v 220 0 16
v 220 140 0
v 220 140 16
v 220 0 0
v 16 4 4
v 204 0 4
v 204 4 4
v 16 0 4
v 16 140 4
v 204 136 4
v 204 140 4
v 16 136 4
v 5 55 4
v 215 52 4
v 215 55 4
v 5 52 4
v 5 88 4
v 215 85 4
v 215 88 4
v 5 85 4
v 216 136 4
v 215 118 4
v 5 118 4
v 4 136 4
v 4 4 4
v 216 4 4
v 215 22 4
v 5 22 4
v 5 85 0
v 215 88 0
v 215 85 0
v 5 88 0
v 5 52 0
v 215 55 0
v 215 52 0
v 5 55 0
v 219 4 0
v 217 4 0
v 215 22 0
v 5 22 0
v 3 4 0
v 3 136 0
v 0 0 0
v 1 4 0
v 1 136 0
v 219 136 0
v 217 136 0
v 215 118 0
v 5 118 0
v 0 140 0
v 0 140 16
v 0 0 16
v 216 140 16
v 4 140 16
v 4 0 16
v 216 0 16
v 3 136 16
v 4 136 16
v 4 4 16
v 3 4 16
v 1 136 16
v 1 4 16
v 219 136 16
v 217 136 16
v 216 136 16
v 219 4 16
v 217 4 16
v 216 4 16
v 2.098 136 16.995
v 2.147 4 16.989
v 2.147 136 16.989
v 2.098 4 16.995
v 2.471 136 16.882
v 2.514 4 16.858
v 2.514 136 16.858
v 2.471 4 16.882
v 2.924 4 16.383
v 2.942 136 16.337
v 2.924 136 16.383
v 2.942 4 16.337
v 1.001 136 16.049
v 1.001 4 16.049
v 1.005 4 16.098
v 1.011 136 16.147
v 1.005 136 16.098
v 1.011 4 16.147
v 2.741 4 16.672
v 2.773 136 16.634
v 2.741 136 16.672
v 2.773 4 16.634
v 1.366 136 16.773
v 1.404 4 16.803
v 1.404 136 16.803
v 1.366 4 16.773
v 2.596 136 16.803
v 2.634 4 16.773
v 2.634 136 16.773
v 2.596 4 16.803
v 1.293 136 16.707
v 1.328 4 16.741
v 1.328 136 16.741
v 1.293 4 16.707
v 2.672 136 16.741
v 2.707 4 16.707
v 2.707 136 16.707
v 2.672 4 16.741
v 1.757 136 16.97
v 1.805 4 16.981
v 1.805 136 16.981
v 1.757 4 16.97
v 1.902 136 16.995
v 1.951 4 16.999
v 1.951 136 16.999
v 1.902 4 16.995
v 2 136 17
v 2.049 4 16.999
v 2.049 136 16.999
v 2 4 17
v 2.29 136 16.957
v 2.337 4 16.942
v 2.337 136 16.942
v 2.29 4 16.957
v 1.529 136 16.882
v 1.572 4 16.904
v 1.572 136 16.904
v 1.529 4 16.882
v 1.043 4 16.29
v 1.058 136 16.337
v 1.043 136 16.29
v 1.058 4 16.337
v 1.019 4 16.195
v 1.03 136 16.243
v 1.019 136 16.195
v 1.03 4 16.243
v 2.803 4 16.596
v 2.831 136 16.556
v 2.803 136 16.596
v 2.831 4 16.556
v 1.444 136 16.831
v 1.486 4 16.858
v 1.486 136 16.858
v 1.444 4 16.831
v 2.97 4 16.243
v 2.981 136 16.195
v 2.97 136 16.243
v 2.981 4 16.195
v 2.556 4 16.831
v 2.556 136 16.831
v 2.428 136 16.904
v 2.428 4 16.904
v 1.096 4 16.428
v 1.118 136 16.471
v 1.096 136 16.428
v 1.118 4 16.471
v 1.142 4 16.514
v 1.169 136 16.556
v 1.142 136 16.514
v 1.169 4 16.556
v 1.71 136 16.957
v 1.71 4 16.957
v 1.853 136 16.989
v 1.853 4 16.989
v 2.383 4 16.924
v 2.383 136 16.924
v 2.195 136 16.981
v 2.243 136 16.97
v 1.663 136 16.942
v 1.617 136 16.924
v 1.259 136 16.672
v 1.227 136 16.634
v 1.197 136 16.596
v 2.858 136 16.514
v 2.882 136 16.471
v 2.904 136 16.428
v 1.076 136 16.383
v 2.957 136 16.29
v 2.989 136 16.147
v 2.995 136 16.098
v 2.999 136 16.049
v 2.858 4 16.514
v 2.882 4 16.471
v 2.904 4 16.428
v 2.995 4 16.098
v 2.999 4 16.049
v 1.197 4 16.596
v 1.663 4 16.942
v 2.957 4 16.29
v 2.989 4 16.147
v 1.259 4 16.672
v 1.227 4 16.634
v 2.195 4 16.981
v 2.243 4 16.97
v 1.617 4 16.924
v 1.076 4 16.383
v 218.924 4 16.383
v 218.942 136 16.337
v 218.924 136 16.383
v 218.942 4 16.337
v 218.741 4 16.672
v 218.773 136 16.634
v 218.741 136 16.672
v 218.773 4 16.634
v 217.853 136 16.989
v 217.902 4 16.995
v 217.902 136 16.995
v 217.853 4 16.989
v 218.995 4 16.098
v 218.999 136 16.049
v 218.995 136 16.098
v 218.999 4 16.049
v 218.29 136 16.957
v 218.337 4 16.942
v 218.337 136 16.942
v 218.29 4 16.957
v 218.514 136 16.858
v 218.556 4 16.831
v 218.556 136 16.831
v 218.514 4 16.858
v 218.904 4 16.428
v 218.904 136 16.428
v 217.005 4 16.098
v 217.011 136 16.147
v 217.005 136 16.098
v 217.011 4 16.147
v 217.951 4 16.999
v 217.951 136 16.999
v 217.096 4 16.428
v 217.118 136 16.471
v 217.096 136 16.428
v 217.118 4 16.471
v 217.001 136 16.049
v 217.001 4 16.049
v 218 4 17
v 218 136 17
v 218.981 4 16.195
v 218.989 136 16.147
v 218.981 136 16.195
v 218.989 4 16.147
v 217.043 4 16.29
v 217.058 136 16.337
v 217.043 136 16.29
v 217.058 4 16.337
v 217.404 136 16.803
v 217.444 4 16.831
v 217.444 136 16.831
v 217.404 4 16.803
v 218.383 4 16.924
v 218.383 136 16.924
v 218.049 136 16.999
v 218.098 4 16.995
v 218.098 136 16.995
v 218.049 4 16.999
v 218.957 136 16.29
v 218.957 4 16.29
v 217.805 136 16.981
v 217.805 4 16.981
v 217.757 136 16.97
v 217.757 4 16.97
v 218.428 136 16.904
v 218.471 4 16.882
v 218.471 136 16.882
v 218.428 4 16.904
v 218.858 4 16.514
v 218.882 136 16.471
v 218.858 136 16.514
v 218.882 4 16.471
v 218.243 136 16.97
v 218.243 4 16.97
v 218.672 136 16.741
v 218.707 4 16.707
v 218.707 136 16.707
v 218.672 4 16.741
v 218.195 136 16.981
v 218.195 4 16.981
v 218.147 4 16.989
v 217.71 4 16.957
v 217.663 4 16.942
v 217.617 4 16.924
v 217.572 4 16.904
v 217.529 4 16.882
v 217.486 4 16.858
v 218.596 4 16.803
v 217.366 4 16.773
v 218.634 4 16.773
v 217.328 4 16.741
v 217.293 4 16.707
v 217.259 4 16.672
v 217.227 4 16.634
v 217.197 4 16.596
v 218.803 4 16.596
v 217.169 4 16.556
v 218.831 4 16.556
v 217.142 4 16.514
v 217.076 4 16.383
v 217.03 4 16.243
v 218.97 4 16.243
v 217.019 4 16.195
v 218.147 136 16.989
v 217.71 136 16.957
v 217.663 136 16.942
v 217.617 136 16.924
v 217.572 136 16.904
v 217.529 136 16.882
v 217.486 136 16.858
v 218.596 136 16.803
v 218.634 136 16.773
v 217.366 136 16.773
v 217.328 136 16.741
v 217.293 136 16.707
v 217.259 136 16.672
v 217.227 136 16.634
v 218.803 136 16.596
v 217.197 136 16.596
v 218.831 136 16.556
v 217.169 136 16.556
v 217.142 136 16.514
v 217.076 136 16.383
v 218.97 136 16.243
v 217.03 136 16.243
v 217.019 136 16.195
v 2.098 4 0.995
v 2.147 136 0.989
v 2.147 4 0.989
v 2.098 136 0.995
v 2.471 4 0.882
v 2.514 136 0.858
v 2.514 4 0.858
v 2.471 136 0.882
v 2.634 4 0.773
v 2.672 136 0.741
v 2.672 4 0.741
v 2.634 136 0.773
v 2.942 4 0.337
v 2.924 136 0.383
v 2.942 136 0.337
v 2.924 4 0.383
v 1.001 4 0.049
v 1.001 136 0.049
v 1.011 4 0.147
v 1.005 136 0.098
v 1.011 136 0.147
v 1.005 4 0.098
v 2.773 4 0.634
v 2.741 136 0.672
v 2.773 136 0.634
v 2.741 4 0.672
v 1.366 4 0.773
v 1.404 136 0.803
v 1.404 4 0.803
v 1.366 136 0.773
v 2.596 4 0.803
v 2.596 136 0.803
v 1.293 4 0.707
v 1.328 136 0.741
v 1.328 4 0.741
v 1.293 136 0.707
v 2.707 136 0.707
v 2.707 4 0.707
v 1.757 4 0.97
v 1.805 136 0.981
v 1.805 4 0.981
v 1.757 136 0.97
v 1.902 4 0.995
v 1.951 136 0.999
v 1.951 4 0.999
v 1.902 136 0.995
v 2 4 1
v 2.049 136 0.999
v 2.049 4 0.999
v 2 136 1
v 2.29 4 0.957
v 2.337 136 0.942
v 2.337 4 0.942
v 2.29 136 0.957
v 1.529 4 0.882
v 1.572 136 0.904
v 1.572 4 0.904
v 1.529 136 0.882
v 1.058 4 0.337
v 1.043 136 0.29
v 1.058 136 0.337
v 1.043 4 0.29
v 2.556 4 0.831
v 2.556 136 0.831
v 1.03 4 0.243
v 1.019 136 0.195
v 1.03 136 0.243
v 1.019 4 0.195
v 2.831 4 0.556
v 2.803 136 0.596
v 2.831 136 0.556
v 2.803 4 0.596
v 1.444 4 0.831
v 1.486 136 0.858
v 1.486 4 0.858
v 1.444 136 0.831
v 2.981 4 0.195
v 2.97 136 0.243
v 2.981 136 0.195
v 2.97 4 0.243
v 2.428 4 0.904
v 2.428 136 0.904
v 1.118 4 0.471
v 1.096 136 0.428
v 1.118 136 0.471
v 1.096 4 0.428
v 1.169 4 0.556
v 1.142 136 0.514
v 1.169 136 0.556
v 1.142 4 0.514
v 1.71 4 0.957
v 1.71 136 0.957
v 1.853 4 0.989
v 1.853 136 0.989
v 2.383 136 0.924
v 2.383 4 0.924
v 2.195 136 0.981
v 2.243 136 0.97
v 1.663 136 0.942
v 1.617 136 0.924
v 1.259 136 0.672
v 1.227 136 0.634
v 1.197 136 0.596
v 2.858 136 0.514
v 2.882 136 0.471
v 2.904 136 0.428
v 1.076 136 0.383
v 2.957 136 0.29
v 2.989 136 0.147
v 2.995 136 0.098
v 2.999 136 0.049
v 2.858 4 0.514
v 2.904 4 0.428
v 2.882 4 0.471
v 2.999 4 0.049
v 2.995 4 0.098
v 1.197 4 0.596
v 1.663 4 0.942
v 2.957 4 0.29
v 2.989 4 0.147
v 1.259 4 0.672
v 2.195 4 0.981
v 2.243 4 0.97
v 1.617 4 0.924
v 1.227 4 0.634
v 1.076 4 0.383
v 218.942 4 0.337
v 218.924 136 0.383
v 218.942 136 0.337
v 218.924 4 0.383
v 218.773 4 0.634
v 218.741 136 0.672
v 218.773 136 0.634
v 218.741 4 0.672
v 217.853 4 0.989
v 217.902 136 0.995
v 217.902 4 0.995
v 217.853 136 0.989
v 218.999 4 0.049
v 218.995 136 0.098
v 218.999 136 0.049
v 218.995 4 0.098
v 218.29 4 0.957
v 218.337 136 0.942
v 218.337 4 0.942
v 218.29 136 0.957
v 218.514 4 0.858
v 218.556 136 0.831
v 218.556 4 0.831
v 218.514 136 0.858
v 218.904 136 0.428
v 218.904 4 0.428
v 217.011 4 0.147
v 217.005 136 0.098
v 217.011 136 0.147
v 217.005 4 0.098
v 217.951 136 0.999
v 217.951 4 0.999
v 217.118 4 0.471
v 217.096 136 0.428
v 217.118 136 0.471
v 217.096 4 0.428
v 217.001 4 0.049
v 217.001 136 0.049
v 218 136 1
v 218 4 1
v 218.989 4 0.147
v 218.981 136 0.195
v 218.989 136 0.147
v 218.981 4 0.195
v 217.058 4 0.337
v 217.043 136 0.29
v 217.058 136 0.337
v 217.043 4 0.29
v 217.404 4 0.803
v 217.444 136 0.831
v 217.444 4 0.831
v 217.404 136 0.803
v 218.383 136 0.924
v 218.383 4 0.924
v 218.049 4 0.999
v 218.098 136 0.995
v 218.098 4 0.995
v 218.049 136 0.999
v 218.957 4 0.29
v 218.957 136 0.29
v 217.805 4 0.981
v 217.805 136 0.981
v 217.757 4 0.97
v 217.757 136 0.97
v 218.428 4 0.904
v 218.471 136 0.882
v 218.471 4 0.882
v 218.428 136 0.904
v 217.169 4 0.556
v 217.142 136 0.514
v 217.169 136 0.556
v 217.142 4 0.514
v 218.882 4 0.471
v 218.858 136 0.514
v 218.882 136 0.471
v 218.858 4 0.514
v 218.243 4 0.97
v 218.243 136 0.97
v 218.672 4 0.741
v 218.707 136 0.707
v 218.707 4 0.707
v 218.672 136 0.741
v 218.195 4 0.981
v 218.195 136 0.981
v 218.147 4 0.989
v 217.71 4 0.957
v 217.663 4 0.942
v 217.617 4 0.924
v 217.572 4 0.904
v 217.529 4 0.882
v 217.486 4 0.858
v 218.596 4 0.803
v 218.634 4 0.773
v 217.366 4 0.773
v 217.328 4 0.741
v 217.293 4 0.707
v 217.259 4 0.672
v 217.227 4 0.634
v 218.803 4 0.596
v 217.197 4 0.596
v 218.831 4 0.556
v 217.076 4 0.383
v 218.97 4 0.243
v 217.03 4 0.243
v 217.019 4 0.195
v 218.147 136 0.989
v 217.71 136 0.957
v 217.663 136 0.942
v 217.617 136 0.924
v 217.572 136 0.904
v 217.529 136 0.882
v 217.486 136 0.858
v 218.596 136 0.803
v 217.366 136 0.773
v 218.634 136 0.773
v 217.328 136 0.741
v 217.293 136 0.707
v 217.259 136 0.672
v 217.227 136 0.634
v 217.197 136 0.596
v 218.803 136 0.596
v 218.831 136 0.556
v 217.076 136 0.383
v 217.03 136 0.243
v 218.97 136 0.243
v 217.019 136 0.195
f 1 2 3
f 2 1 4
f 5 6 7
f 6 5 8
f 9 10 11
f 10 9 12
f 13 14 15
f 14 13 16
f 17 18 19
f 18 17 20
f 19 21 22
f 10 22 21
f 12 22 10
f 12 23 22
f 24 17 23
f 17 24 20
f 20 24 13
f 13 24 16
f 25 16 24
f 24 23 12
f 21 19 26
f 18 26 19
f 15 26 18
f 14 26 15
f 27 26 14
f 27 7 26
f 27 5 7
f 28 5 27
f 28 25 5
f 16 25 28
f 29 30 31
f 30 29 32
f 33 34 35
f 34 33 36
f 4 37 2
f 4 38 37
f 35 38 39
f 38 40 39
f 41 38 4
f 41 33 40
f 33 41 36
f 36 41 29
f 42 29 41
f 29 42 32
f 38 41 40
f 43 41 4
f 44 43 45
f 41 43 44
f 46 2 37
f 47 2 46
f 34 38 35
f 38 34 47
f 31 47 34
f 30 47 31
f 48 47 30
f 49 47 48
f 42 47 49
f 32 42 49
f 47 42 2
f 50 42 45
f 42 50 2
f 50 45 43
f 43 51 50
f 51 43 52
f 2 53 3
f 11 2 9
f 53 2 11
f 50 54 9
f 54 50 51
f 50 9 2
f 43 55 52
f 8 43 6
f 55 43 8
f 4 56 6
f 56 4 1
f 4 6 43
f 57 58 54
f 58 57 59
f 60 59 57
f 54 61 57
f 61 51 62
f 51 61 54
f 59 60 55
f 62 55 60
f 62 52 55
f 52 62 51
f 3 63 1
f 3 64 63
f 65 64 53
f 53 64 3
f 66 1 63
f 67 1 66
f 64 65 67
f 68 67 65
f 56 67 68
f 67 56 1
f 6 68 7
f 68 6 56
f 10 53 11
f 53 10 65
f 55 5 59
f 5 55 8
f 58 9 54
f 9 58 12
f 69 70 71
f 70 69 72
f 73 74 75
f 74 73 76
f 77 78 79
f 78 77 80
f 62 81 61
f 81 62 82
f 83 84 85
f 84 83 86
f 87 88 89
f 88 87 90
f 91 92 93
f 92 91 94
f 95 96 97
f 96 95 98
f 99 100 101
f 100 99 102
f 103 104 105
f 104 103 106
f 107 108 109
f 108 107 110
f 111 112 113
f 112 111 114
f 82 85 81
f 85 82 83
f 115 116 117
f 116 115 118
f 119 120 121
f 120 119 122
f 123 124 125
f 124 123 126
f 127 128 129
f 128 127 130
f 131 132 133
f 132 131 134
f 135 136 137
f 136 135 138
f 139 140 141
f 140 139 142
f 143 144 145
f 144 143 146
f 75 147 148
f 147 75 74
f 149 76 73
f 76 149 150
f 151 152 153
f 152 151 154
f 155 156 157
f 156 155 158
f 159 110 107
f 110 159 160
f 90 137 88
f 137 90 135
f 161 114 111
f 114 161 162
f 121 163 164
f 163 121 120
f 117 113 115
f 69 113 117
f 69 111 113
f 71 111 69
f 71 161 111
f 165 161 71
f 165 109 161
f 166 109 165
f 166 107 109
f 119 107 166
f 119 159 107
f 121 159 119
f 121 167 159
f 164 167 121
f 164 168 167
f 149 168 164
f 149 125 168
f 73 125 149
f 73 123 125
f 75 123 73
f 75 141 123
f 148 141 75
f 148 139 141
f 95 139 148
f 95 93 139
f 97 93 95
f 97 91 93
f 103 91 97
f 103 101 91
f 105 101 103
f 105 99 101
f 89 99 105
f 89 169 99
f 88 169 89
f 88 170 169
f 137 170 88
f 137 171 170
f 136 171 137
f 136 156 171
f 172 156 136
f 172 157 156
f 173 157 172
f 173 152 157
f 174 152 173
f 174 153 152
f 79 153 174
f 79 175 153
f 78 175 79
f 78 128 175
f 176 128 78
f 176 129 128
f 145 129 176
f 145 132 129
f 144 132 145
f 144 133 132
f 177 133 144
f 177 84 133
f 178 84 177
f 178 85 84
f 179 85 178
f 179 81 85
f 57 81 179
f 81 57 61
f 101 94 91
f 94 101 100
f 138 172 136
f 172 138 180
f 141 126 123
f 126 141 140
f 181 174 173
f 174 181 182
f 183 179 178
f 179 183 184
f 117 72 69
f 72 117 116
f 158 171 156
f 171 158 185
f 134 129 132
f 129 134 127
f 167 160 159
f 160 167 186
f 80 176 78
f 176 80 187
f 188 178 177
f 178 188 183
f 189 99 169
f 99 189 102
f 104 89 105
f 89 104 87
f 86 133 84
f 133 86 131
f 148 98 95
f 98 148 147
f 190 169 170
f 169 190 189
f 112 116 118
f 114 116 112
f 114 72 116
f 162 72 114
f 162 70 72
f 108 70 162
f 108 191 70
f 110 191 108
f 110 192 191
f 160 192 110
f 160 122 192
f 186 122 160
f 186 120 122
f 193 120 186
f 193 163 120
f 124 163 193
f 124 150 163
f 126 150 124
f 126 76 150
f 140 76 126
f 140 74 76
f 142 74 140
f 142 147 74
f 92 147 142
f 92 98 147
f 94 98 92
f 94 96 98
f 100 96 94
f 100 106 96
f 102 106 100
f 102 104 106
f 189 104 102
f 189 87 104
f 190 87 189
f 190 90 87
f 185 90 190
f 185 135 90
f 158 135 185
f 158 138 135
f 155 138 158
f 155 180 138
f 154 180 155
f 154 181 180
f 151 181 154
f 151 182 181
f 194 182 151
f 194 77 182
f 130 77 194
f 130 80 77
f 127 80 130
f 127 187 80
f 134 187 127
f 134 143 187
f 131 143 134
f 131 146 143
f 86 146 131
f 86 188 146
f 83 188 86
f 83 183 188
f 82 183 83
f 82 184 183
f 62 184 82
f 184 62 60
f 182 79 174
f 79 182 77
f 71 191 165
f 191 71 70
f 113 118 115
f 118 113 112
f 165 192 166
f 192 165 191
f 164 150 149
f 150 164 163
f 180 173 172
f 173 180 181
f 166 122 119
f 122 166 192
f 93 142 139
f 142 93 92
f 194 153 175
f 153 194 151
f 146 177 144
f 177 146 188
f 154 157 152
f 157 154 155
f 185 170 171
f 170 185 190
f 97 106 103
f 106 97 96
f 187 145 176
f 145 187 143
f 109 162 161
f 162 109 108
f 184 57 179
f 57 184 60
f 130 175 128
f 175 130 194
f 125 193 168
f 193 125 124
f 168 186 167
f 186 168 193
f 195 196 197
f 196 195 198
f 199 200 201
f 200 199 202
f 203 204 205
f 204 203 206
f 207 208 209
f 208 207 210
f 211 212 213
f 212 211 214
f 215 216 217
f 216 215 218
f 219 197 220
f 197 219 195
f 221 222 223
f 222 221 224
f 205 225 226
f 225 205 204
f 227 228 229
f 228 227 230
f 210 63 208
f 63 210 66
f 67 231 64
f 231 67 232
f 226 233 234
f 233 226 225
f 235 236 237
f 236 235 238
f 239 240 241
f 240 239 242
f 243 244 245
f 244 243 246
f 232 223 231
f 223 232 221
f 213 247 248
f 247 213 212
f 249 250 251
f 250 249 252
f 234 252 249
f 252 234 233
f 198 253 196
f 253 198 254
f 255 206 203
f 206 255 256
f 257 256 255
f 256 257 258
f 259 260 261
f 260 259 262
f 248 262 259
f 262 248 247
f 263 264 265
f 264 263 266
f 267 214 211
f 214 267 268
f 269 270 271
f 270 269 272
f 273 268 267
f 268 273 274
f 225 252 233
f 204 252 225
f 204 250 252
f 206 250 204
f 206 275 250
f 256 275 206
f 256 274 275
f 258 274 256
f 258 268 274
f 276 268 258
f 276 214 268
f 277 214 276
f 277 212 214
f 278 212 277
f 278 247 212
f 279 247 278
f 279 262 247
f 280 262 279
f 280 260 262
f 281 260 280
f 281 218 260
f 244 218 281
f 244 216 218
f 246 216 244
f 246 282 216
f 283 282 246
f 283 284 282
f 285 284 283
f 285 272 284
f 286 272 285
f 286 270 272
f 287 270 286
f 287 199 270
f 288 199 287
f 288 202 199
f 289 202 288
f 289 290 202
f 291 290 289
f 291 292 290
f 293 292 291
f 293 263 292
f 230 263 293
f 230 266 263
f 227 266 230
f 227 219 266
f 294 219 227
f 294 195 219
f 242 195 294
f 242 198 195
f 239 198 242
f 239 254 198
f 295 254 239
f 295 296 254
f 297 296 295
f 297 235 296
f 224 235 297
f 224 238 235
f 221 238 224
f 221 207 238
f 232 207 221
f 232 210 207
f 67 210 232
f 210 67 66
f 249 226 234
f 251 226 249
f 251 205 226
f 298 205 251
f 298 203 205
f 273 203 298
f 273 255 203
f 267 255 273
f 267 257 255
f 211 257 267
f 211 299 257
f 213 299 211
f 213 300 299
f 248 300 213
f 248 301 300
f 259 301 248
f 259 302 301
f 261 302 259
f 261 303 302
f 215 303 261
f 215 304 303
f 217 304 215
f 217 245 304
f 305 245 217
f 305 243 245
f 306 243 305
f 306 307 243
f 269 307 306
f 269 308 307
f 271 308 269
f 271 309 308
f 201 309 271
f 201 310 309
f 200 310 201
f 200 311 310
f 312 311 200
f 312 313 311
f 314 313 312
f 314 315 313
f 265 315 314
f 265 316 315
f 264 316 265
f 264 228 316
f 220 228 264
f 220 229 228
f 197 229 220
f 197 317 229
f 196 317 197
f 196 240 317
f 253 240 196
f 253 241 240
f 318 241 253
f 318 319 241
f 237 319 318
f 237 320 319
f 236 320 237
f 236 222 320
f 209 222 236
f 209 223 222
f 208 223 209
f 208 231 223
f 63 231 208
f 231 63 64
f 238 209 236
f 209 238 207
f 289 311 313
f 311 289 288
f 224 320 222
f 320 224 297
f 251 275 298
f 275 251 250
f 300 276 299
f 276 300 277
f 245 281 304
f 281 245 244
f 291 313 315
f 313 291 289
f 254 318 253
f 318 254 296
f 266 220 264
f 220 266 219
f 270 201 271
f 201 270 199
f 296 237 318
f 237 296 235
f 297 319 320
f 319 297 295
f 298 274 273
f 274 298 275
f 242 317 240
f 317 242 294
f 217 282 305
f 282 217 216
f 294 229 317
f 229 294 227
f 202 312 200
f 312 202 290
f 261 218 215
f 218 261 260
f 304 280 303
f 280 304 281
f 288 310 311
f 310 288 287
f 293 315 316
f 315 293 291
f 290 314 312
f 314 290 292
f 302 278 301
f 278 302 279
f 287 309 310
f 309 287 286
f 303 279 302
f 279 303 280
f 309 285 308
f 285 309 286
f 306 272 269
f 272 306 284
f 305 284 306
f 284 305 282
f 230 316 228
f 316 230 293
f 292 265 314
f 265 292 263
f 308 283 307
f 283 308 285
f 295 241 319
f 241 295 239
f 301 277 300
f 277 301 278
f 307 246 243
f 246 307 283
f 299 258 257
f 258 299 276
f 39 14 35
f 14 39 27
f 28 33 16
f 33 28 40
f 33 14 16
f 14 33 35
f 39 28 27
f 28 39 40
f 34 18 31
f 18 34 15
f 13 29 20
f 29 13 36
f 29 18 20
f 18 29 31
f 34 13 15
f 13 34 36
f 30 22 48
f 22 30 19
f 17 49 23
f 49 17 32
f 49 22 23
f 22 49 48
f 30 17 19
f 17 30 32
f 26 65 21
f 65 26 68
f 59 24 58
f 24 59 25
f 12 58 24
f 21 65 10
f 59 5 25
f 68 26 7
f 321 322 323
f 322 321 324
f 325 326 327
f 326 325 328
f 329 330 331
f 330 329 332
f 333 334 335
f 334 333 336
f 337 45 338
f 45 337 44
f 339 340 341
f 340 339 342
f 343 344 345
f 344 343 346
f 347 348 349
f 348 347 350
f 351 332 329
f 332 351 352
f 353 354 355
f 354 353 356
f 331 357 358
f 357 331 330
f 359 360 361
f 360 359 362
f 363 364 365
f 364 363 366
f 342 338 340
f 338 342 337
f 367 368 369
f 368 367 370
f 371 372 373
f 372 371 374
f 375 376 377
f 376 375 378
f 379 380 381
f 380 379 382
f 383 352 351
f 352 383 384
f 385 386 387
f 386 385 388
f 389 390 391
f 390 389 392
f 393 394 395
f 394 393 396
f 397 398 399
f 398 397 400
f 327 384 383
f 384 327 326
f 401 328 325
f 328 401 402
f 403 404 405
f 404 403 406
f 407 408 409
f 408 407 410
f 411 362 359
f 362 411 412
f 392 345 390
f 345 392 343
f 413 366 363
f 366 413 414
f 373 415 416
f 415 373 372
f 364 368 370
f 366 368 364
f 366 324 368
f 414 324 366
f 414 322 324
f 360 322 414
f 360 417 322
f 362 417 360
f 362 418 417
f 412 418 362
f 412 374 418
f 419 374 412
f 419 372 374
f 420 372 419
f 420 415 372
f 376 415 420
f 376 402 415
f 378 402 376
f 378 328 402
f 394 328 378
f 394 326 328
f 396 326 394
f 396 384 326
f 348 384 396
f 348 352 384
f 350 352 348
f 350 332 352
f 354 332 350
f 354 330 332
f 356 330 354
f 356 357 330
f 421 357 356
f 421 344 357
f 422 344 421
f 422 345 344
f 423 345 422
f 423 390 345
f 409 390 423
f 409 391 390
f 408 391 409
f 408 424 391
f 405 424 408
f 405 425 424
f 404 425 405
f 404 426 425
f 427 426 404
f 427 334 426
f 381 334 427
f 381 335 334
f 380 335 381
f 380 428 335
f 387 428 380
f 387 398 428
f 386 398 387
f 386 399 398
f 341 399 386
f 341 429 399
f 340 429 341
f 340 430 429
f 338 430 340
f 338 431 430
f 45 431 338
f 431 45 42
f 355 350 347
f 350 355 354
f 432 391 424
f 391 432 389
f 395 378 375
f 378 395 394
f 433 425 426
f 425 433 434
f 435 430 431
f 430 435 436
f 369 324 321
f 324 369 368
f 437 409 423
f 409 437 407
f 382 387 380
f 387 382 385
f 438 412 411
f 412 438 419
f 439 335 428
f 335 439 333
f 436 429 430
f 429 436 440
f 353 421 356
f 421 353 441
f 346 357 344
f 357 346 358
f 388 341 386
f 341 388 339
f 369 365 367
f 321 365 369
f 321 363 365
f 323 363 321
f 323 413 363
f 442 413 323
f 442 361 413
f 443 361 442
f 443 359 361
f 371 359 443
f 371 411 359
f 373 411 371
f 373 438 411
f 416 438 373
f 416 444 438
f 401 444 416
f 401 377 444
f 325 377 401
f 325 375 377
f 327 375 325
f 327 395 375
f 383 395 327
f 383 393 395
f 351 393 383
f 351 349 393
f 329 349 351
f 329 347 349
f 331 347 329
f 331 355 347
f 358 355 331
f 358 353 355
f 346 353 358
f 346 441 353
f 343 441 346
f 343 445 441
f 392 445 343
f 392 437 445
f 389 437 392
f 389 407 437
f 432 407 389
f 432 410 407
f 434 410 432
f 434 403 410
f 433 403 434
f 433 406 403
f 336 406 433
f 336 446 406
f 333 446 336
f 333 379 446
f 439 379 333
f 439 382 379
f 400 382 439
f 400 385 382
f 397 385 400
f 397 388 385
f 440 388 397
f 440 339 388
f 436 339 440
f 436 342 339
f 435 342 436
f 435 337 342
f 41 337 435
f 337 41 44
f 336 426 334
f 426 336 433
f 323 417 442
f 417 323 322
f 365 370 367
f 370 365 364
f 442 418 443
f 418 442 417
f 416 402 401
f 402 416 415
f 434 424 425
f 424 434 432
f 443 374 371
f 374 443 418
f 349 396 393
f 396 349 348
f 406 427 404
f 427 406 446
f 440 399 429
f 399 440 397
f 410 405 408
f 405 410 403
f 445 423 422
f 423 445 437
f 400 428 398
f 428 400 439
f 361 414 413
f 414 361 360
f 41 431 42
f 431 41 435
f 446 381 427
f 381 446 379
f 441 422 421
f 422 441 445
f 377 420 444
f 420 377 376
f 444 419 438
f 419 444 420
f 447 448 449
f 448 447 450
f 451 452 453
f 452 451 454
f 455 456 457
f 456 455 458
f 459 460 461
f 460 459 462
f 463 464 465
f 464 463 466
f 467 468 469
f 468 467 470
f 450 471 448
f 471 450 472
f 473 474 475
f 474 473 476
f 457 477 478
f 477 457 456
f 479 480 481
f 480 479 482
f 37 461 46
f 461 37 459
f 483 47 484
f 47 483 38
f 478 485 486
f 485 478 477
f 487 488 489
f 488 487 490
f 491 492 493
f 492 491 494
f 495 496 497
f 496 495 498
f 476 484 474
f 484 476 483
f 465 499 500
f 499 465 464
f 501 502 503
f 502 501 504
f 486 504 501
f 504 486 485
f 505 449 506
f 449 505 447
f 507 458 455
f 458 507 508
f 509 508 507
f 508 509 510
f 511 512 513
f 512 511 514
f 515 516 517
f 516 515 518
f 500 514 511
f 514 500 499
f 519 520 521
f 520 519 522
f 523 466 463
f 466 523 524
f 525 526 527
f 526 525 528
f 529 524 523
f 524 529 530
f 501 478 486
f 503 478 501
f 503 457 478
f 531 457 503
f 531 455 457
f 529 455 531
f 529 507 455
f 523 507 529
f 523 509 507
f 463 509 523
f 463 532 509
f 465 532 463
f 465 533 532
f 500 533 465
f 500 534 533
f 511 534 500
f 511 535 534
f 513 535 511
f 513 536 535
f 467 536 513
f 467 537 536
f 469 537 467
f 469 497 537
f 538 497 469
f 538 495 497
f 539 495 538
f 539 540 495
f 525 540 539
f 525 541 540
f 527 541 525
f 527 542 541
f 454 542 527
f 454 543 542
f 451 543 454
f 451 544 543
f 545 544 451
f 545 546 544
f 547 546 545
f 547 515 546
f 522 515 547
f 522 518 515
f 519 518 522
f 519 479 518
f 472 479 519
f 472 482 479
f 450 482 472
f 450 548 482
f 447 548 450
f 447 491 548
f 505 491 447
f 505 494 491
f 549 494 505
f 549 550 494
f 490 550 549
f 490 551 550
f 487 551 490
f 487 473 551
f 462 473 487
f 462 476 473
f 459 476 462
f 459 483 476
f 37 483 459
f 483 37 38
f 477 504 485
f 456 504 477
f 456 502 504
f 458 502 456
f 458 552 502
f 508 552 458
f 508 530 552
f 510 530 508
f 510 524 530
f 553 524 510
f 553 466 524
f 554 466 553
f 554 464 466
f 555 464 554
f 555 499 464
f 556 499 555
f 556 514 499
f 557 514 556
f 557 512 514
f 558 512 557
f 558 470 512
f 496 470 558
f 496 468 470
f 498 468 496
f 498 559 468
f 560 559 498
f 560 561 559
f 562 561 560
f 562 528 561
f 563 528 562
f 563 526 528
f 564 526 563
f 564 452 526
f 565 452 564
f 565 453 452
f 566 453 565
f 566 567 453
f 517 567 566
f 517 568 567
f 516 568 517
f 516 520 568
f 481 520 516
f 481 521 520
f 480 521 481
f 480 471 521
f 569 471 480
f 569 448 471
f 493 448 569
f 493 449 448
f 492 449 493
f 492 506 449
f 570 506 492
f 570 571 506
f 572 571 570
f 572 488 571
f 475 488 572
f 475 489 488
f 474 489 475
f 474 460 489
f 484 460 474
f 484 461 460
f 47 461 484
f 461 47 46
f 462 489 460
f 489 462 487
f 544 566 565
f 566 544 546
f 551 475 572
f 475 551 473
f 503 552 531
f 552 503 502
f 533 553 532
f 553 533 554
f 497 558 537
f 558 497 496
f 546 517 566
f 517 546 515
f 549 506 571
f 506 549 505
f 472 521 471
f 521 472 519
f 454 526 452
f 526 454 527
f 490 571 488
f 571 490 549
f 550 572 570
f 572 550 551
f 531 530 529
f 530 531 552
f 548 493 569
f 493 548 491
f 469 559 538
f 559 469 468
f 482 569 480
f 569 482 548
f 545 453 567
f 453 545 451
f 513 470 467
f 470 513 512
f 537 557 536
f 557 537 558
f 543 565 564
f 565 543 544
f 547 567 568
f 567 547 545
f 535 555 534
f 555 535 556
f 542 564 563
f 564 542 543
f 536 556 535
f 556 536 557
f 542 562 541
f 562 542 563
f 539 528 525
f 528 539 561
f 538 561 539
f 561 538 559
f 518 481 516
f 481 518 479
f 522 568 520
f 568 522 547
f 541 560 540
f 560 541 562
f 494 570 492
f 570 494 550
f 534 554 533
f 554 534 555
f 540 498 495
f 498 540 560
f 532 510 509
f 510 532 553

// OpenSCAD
tray_depth=220; // fixed
tray_width=140; // fixed
tray_height=12; // variable
tray_wall=4;

difference() {

    union() { 
        cube([tray_depth,tray_width,tray_wall]); // Fixed thickness of resting surface
        // end legs
        translate([0,0,tray_wall]) cube([tray_wall,tray_width,tray_height]);
        translate([(tray_depth-tray_wall),0,tray_wall]) cube ([tray_wall,tray_width,tray_height]);
        // support slants
        translate([(tray_depth-tray_height-(tray_wall*2)),0,0]) rotate([270,270,0]) linear_extrude(tray_width) polygon([[0,0],[0,tray_height+tray_wall],[tray_height+tray_wall,tray_height+tray_wall]]);
        translate([tray_wall,0,tray_height+tray_wall]) rotate([270,0,0]) linear_extrude(tray_width) polygon([[0,0],[0,tray_height],[tray_height,tray_height]]);
        // positive registration
        translate([(tray_wall/2),tray_wall,tray_height+tray_wall]) rotate([270,270,0]) cylinder(tray_width-(tray_wall*2),r=(tray_wall/2)-1, $fn=128);
        translate([tray_depth-(tray_wall/2),tray_wall,tray_height+tray_wall]) rotate([270,0,0]) cylinder(tray_width-(tray_wall*2),r=(tray_wall/2)-1, $fn=128);
    }
    
    translate([tray_wall,tray_wall,tray_wall]) cube([tray_depth-(tray_wall*2), tray_width-(tray_wall*2), tray_height]);// interior void
    // negative registration
    translate([(tray_wall/2),tray_wall,0]) rotate([270,270,0]) cylinder(tray_width-(tray_wall*2),r=(tray_wall/2)-1, $fn=128);
    translate([tray_depth-(tray_wall/2),tray_wall,0]) rotate([270,0,0]) cylinder(tray_width-(tray_wall*2),r=(tray_wall/2)-1, $fn=128);
    
    
    // cutouts
    /*
    Space Invader - 208mm x 122mm x 16mm
    Dog Paw - 214mm x 108mm x 20mm 
    Dog Bone - 202mm x 126mm x 24mm
    Fruit - 216mm x 104mm x 17mm
    */
    
    //space invader
    //translate([(tray_depth/2)-(190/2),(tray_width/2)-(104/2),0]) cube([190, 104, tray_wall]);
    //fruit
    translate([(tray_depth/2)-(210/2),(tray_width/2)-(96/2),0]) fruit_cutouts();
    
};


module fruit_cutouts() {
    // 96, 30 + 3 + 30 + 3+ 30
    cube([210, 30, tray_wall]);
    translate([0,33,0]) cube([210, 30, tray_wall]);
    translate([0,66,0]) cube([210, 30, tray_wall]);
};
